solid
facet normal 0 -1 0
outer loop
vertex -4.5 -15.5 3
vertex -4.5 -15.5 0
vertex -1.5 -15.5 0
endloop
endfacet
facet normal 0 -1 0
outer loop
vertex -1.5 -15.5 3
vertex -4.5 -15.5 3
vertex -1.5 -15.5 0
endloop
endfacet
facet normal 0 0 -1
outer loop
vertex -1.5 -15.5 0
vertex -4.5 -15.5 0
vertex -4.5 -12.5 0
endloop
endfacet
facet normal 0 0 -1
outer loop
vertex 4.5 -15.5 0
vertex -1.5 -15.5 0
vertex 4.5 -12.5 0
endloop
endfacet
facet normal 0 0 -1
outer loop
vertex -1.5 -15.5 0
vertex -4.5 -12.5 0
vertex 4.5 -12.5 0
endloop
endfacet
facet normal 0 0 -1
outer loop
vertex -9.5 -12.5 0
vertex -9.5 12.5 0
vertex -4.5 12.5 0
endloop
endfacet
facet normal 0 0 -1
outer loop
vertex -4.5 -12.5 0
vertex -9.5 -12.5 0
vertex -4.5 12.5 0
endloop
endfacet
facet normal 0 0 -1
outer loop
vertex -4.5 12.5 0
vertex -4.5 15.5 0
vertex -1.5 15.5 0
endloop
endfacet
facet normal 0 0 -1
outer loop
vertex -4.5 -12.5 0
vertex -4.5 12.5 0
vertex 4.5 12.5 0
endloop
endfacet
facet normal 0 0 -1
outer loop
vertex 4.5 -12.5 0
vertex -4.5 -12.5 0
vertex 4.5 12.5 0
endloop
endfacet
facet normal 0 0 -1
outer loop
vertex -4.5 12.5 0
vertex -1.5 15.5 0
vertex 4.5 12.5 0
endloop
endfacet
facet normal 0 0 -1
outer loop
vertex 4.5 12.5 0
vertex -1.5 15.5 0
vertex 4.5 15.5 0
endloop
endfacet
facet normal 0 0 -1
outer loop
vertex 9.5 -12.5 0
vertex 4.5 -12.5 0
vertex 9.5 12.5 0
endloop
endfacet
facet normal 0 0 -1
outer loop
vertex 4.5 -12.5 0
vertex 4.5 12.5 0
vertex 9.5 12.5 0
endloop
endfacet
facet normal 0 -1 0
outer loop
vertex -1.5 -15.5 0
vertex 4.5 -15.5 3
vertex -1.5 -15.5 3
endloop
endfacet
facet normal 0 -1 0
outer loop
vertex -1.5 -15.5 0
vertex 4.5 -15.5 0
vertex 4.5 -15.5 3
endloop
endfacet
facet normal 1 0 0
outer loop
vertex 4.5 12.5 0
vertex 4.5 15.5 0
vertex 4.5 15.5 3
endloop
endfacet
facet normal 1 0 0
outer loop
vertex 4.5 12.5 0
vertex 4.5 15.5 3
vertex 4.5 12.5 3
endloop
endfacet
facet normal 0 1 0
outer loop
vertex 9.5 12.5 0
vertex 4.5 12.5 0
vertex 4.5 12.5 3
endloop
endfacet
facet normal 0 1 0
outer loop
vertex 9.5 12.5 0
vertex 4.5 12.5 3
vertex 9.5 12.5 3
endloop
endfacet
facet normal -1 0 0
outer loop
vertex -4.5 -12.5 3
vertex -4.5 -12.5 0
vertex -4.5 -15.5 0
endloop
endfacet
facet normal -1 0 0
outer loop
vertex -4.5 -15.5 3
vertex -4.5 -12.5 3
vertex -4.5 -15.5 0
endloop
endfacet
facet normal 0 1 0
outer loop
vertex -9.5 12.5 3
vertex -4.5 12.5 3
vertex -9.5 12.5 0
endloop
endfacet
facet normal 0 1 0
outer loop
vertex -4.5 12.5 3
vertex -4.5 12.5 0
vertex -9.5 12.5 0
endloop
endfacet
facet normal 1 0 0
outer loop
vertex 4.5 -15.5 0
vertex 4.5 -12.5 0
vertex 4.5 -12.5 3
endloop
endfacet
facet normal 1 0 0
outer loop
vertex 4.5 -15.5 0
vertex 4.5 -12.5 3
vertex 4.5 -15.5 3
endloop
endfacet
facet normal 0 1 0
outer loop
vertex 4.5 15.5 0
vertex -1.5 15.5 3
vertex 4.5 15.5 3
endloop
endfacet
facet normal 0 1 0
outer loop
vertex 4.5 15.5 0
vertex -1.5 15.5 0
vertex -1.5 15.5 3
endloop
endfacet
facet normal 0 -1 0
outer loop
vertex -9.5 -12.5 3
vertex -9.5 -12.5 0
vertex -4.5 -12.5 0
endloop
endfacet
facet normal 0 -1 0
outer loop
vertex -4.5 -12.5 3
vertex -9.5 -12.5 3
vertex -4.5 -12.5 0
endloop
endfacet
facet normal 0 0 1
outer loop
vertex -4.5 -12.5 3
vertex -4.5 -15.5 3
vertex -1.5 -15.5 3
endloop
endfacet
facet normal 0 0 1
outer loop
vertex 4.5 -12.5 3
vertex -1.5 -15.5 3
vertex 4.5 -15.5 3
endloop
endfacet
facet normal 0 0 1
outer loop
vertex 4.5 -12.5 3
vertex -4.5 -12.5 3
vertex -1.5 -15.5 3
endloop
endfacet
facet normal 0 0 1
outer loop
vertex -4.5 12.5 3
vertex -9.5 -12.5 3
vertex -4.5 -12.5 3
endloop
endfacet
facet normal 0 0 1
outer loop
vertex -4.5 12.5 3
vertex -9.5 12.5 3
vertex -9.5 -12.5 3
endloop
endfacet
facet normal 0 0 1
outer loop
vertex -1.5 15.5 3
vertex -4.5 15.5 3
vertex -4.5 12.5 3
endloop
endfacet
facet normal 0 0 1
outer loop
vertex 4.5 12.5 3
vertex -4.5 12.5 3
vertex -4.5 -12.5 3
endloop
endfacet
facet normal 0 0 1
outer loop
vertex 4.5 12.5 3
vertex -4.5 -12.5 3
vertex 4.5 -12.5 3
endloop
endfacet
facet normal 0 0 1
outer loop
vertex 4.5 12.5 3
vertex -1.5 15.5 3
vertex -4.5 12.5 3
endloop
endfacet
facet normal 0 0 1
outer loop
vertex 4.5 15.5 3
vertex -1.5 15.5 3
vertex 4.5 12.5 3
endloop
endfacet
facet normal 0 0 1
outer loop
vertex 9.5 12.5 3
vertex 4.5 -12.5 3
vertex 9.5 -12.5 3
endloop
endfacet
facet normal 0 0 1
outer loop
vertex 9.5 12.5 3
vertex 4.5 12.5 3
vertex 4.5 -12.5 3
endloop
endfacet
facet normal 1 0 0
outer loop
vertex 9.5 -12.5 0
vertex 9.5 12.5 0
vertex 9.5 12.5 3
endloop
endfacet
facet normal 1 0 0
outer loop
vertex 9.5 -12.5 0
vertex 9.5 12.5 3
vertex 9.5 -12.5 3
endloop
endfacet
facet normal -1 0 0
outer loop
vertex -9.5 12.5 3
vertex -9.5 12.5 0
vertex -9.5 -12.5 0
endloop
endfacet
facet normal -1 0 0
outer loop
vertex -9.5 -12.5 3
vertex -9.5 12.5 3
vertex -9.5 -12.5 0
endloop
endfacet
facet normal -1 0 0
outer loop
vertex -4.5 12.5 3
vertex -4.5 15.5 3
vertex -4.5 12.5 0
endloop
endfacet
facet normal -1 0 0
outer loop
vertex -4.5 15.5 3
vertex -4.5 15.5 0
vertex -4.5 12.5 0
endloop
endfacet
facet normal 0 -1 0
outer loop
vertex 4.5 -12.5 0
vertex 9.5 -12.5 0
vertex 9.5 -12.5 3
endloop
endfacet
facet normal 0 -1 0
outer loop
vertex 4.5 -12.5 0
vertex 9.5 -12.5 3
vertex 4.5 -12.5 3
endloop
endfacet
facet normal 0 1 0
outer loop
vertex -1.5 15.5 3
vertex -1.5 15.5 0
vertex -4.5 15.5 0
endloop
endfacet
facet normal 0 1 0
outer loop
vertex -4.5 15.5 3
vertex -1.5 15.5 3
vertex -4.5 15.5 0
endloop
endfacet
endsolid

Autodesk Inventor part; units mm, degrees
ref_plane "YZ Plane" through (0, 0, 0) normal (1, 0, 0) x (0, 1, 0)
ref_plane "XZ Plane" through (0, 0, 0) normal (0, 1, 0) x (-1, 0, 0)
ref_plane "XY Plane" through (0, 0, 0) normal (0, 0, 1) x (1, 0, 0)
sketch "Boceto1" plane through (0, 0, 0) normal (0, 0, 1) x (1, 0, 0)
  line L0 (-4.5, 15.5) -> (-4.5, 12.5)
  line L1 (-4.5, 12.5) -> (-9.5, 12.5)
  line L2 (-9.5, 12.5) -> (-9.5, -12.5)
  line L3 (-9.5, -12.5) -> (-4.5, -12.5)
  line L4 (-4.5, -12.5) -> (-4.5, -15.5)
  line L5 (-4.5, -15.5) -> (-1.5, -15.5)
  line L6 (-1.5, 15.5) -> (-4.5, 15.5)
  line L7 (9.5, 12.5) -> (9.5, -12.5)
  line L8 (9.5, -12.5) -> (4.5, -12.5)
  line L9 (4.5, -12.5) -> (4.5, -15.5)
  line L10 (4.5, -15.5) -> (-4.5, -15.5)
  line L11 (-4.5, 15.5) -> (4.5, 15.5)
  line L12 (4.5, 15.5) -> (4.5, 12.5)
  line L13 (4.5, 12.5) -> (9.5, 12.5)
extrude "Extrusión1" add sketch "Boceto1" along normal blind 3
properties part number "Wall_Base2" material "MDF Tablero de fibras de densidad media"
